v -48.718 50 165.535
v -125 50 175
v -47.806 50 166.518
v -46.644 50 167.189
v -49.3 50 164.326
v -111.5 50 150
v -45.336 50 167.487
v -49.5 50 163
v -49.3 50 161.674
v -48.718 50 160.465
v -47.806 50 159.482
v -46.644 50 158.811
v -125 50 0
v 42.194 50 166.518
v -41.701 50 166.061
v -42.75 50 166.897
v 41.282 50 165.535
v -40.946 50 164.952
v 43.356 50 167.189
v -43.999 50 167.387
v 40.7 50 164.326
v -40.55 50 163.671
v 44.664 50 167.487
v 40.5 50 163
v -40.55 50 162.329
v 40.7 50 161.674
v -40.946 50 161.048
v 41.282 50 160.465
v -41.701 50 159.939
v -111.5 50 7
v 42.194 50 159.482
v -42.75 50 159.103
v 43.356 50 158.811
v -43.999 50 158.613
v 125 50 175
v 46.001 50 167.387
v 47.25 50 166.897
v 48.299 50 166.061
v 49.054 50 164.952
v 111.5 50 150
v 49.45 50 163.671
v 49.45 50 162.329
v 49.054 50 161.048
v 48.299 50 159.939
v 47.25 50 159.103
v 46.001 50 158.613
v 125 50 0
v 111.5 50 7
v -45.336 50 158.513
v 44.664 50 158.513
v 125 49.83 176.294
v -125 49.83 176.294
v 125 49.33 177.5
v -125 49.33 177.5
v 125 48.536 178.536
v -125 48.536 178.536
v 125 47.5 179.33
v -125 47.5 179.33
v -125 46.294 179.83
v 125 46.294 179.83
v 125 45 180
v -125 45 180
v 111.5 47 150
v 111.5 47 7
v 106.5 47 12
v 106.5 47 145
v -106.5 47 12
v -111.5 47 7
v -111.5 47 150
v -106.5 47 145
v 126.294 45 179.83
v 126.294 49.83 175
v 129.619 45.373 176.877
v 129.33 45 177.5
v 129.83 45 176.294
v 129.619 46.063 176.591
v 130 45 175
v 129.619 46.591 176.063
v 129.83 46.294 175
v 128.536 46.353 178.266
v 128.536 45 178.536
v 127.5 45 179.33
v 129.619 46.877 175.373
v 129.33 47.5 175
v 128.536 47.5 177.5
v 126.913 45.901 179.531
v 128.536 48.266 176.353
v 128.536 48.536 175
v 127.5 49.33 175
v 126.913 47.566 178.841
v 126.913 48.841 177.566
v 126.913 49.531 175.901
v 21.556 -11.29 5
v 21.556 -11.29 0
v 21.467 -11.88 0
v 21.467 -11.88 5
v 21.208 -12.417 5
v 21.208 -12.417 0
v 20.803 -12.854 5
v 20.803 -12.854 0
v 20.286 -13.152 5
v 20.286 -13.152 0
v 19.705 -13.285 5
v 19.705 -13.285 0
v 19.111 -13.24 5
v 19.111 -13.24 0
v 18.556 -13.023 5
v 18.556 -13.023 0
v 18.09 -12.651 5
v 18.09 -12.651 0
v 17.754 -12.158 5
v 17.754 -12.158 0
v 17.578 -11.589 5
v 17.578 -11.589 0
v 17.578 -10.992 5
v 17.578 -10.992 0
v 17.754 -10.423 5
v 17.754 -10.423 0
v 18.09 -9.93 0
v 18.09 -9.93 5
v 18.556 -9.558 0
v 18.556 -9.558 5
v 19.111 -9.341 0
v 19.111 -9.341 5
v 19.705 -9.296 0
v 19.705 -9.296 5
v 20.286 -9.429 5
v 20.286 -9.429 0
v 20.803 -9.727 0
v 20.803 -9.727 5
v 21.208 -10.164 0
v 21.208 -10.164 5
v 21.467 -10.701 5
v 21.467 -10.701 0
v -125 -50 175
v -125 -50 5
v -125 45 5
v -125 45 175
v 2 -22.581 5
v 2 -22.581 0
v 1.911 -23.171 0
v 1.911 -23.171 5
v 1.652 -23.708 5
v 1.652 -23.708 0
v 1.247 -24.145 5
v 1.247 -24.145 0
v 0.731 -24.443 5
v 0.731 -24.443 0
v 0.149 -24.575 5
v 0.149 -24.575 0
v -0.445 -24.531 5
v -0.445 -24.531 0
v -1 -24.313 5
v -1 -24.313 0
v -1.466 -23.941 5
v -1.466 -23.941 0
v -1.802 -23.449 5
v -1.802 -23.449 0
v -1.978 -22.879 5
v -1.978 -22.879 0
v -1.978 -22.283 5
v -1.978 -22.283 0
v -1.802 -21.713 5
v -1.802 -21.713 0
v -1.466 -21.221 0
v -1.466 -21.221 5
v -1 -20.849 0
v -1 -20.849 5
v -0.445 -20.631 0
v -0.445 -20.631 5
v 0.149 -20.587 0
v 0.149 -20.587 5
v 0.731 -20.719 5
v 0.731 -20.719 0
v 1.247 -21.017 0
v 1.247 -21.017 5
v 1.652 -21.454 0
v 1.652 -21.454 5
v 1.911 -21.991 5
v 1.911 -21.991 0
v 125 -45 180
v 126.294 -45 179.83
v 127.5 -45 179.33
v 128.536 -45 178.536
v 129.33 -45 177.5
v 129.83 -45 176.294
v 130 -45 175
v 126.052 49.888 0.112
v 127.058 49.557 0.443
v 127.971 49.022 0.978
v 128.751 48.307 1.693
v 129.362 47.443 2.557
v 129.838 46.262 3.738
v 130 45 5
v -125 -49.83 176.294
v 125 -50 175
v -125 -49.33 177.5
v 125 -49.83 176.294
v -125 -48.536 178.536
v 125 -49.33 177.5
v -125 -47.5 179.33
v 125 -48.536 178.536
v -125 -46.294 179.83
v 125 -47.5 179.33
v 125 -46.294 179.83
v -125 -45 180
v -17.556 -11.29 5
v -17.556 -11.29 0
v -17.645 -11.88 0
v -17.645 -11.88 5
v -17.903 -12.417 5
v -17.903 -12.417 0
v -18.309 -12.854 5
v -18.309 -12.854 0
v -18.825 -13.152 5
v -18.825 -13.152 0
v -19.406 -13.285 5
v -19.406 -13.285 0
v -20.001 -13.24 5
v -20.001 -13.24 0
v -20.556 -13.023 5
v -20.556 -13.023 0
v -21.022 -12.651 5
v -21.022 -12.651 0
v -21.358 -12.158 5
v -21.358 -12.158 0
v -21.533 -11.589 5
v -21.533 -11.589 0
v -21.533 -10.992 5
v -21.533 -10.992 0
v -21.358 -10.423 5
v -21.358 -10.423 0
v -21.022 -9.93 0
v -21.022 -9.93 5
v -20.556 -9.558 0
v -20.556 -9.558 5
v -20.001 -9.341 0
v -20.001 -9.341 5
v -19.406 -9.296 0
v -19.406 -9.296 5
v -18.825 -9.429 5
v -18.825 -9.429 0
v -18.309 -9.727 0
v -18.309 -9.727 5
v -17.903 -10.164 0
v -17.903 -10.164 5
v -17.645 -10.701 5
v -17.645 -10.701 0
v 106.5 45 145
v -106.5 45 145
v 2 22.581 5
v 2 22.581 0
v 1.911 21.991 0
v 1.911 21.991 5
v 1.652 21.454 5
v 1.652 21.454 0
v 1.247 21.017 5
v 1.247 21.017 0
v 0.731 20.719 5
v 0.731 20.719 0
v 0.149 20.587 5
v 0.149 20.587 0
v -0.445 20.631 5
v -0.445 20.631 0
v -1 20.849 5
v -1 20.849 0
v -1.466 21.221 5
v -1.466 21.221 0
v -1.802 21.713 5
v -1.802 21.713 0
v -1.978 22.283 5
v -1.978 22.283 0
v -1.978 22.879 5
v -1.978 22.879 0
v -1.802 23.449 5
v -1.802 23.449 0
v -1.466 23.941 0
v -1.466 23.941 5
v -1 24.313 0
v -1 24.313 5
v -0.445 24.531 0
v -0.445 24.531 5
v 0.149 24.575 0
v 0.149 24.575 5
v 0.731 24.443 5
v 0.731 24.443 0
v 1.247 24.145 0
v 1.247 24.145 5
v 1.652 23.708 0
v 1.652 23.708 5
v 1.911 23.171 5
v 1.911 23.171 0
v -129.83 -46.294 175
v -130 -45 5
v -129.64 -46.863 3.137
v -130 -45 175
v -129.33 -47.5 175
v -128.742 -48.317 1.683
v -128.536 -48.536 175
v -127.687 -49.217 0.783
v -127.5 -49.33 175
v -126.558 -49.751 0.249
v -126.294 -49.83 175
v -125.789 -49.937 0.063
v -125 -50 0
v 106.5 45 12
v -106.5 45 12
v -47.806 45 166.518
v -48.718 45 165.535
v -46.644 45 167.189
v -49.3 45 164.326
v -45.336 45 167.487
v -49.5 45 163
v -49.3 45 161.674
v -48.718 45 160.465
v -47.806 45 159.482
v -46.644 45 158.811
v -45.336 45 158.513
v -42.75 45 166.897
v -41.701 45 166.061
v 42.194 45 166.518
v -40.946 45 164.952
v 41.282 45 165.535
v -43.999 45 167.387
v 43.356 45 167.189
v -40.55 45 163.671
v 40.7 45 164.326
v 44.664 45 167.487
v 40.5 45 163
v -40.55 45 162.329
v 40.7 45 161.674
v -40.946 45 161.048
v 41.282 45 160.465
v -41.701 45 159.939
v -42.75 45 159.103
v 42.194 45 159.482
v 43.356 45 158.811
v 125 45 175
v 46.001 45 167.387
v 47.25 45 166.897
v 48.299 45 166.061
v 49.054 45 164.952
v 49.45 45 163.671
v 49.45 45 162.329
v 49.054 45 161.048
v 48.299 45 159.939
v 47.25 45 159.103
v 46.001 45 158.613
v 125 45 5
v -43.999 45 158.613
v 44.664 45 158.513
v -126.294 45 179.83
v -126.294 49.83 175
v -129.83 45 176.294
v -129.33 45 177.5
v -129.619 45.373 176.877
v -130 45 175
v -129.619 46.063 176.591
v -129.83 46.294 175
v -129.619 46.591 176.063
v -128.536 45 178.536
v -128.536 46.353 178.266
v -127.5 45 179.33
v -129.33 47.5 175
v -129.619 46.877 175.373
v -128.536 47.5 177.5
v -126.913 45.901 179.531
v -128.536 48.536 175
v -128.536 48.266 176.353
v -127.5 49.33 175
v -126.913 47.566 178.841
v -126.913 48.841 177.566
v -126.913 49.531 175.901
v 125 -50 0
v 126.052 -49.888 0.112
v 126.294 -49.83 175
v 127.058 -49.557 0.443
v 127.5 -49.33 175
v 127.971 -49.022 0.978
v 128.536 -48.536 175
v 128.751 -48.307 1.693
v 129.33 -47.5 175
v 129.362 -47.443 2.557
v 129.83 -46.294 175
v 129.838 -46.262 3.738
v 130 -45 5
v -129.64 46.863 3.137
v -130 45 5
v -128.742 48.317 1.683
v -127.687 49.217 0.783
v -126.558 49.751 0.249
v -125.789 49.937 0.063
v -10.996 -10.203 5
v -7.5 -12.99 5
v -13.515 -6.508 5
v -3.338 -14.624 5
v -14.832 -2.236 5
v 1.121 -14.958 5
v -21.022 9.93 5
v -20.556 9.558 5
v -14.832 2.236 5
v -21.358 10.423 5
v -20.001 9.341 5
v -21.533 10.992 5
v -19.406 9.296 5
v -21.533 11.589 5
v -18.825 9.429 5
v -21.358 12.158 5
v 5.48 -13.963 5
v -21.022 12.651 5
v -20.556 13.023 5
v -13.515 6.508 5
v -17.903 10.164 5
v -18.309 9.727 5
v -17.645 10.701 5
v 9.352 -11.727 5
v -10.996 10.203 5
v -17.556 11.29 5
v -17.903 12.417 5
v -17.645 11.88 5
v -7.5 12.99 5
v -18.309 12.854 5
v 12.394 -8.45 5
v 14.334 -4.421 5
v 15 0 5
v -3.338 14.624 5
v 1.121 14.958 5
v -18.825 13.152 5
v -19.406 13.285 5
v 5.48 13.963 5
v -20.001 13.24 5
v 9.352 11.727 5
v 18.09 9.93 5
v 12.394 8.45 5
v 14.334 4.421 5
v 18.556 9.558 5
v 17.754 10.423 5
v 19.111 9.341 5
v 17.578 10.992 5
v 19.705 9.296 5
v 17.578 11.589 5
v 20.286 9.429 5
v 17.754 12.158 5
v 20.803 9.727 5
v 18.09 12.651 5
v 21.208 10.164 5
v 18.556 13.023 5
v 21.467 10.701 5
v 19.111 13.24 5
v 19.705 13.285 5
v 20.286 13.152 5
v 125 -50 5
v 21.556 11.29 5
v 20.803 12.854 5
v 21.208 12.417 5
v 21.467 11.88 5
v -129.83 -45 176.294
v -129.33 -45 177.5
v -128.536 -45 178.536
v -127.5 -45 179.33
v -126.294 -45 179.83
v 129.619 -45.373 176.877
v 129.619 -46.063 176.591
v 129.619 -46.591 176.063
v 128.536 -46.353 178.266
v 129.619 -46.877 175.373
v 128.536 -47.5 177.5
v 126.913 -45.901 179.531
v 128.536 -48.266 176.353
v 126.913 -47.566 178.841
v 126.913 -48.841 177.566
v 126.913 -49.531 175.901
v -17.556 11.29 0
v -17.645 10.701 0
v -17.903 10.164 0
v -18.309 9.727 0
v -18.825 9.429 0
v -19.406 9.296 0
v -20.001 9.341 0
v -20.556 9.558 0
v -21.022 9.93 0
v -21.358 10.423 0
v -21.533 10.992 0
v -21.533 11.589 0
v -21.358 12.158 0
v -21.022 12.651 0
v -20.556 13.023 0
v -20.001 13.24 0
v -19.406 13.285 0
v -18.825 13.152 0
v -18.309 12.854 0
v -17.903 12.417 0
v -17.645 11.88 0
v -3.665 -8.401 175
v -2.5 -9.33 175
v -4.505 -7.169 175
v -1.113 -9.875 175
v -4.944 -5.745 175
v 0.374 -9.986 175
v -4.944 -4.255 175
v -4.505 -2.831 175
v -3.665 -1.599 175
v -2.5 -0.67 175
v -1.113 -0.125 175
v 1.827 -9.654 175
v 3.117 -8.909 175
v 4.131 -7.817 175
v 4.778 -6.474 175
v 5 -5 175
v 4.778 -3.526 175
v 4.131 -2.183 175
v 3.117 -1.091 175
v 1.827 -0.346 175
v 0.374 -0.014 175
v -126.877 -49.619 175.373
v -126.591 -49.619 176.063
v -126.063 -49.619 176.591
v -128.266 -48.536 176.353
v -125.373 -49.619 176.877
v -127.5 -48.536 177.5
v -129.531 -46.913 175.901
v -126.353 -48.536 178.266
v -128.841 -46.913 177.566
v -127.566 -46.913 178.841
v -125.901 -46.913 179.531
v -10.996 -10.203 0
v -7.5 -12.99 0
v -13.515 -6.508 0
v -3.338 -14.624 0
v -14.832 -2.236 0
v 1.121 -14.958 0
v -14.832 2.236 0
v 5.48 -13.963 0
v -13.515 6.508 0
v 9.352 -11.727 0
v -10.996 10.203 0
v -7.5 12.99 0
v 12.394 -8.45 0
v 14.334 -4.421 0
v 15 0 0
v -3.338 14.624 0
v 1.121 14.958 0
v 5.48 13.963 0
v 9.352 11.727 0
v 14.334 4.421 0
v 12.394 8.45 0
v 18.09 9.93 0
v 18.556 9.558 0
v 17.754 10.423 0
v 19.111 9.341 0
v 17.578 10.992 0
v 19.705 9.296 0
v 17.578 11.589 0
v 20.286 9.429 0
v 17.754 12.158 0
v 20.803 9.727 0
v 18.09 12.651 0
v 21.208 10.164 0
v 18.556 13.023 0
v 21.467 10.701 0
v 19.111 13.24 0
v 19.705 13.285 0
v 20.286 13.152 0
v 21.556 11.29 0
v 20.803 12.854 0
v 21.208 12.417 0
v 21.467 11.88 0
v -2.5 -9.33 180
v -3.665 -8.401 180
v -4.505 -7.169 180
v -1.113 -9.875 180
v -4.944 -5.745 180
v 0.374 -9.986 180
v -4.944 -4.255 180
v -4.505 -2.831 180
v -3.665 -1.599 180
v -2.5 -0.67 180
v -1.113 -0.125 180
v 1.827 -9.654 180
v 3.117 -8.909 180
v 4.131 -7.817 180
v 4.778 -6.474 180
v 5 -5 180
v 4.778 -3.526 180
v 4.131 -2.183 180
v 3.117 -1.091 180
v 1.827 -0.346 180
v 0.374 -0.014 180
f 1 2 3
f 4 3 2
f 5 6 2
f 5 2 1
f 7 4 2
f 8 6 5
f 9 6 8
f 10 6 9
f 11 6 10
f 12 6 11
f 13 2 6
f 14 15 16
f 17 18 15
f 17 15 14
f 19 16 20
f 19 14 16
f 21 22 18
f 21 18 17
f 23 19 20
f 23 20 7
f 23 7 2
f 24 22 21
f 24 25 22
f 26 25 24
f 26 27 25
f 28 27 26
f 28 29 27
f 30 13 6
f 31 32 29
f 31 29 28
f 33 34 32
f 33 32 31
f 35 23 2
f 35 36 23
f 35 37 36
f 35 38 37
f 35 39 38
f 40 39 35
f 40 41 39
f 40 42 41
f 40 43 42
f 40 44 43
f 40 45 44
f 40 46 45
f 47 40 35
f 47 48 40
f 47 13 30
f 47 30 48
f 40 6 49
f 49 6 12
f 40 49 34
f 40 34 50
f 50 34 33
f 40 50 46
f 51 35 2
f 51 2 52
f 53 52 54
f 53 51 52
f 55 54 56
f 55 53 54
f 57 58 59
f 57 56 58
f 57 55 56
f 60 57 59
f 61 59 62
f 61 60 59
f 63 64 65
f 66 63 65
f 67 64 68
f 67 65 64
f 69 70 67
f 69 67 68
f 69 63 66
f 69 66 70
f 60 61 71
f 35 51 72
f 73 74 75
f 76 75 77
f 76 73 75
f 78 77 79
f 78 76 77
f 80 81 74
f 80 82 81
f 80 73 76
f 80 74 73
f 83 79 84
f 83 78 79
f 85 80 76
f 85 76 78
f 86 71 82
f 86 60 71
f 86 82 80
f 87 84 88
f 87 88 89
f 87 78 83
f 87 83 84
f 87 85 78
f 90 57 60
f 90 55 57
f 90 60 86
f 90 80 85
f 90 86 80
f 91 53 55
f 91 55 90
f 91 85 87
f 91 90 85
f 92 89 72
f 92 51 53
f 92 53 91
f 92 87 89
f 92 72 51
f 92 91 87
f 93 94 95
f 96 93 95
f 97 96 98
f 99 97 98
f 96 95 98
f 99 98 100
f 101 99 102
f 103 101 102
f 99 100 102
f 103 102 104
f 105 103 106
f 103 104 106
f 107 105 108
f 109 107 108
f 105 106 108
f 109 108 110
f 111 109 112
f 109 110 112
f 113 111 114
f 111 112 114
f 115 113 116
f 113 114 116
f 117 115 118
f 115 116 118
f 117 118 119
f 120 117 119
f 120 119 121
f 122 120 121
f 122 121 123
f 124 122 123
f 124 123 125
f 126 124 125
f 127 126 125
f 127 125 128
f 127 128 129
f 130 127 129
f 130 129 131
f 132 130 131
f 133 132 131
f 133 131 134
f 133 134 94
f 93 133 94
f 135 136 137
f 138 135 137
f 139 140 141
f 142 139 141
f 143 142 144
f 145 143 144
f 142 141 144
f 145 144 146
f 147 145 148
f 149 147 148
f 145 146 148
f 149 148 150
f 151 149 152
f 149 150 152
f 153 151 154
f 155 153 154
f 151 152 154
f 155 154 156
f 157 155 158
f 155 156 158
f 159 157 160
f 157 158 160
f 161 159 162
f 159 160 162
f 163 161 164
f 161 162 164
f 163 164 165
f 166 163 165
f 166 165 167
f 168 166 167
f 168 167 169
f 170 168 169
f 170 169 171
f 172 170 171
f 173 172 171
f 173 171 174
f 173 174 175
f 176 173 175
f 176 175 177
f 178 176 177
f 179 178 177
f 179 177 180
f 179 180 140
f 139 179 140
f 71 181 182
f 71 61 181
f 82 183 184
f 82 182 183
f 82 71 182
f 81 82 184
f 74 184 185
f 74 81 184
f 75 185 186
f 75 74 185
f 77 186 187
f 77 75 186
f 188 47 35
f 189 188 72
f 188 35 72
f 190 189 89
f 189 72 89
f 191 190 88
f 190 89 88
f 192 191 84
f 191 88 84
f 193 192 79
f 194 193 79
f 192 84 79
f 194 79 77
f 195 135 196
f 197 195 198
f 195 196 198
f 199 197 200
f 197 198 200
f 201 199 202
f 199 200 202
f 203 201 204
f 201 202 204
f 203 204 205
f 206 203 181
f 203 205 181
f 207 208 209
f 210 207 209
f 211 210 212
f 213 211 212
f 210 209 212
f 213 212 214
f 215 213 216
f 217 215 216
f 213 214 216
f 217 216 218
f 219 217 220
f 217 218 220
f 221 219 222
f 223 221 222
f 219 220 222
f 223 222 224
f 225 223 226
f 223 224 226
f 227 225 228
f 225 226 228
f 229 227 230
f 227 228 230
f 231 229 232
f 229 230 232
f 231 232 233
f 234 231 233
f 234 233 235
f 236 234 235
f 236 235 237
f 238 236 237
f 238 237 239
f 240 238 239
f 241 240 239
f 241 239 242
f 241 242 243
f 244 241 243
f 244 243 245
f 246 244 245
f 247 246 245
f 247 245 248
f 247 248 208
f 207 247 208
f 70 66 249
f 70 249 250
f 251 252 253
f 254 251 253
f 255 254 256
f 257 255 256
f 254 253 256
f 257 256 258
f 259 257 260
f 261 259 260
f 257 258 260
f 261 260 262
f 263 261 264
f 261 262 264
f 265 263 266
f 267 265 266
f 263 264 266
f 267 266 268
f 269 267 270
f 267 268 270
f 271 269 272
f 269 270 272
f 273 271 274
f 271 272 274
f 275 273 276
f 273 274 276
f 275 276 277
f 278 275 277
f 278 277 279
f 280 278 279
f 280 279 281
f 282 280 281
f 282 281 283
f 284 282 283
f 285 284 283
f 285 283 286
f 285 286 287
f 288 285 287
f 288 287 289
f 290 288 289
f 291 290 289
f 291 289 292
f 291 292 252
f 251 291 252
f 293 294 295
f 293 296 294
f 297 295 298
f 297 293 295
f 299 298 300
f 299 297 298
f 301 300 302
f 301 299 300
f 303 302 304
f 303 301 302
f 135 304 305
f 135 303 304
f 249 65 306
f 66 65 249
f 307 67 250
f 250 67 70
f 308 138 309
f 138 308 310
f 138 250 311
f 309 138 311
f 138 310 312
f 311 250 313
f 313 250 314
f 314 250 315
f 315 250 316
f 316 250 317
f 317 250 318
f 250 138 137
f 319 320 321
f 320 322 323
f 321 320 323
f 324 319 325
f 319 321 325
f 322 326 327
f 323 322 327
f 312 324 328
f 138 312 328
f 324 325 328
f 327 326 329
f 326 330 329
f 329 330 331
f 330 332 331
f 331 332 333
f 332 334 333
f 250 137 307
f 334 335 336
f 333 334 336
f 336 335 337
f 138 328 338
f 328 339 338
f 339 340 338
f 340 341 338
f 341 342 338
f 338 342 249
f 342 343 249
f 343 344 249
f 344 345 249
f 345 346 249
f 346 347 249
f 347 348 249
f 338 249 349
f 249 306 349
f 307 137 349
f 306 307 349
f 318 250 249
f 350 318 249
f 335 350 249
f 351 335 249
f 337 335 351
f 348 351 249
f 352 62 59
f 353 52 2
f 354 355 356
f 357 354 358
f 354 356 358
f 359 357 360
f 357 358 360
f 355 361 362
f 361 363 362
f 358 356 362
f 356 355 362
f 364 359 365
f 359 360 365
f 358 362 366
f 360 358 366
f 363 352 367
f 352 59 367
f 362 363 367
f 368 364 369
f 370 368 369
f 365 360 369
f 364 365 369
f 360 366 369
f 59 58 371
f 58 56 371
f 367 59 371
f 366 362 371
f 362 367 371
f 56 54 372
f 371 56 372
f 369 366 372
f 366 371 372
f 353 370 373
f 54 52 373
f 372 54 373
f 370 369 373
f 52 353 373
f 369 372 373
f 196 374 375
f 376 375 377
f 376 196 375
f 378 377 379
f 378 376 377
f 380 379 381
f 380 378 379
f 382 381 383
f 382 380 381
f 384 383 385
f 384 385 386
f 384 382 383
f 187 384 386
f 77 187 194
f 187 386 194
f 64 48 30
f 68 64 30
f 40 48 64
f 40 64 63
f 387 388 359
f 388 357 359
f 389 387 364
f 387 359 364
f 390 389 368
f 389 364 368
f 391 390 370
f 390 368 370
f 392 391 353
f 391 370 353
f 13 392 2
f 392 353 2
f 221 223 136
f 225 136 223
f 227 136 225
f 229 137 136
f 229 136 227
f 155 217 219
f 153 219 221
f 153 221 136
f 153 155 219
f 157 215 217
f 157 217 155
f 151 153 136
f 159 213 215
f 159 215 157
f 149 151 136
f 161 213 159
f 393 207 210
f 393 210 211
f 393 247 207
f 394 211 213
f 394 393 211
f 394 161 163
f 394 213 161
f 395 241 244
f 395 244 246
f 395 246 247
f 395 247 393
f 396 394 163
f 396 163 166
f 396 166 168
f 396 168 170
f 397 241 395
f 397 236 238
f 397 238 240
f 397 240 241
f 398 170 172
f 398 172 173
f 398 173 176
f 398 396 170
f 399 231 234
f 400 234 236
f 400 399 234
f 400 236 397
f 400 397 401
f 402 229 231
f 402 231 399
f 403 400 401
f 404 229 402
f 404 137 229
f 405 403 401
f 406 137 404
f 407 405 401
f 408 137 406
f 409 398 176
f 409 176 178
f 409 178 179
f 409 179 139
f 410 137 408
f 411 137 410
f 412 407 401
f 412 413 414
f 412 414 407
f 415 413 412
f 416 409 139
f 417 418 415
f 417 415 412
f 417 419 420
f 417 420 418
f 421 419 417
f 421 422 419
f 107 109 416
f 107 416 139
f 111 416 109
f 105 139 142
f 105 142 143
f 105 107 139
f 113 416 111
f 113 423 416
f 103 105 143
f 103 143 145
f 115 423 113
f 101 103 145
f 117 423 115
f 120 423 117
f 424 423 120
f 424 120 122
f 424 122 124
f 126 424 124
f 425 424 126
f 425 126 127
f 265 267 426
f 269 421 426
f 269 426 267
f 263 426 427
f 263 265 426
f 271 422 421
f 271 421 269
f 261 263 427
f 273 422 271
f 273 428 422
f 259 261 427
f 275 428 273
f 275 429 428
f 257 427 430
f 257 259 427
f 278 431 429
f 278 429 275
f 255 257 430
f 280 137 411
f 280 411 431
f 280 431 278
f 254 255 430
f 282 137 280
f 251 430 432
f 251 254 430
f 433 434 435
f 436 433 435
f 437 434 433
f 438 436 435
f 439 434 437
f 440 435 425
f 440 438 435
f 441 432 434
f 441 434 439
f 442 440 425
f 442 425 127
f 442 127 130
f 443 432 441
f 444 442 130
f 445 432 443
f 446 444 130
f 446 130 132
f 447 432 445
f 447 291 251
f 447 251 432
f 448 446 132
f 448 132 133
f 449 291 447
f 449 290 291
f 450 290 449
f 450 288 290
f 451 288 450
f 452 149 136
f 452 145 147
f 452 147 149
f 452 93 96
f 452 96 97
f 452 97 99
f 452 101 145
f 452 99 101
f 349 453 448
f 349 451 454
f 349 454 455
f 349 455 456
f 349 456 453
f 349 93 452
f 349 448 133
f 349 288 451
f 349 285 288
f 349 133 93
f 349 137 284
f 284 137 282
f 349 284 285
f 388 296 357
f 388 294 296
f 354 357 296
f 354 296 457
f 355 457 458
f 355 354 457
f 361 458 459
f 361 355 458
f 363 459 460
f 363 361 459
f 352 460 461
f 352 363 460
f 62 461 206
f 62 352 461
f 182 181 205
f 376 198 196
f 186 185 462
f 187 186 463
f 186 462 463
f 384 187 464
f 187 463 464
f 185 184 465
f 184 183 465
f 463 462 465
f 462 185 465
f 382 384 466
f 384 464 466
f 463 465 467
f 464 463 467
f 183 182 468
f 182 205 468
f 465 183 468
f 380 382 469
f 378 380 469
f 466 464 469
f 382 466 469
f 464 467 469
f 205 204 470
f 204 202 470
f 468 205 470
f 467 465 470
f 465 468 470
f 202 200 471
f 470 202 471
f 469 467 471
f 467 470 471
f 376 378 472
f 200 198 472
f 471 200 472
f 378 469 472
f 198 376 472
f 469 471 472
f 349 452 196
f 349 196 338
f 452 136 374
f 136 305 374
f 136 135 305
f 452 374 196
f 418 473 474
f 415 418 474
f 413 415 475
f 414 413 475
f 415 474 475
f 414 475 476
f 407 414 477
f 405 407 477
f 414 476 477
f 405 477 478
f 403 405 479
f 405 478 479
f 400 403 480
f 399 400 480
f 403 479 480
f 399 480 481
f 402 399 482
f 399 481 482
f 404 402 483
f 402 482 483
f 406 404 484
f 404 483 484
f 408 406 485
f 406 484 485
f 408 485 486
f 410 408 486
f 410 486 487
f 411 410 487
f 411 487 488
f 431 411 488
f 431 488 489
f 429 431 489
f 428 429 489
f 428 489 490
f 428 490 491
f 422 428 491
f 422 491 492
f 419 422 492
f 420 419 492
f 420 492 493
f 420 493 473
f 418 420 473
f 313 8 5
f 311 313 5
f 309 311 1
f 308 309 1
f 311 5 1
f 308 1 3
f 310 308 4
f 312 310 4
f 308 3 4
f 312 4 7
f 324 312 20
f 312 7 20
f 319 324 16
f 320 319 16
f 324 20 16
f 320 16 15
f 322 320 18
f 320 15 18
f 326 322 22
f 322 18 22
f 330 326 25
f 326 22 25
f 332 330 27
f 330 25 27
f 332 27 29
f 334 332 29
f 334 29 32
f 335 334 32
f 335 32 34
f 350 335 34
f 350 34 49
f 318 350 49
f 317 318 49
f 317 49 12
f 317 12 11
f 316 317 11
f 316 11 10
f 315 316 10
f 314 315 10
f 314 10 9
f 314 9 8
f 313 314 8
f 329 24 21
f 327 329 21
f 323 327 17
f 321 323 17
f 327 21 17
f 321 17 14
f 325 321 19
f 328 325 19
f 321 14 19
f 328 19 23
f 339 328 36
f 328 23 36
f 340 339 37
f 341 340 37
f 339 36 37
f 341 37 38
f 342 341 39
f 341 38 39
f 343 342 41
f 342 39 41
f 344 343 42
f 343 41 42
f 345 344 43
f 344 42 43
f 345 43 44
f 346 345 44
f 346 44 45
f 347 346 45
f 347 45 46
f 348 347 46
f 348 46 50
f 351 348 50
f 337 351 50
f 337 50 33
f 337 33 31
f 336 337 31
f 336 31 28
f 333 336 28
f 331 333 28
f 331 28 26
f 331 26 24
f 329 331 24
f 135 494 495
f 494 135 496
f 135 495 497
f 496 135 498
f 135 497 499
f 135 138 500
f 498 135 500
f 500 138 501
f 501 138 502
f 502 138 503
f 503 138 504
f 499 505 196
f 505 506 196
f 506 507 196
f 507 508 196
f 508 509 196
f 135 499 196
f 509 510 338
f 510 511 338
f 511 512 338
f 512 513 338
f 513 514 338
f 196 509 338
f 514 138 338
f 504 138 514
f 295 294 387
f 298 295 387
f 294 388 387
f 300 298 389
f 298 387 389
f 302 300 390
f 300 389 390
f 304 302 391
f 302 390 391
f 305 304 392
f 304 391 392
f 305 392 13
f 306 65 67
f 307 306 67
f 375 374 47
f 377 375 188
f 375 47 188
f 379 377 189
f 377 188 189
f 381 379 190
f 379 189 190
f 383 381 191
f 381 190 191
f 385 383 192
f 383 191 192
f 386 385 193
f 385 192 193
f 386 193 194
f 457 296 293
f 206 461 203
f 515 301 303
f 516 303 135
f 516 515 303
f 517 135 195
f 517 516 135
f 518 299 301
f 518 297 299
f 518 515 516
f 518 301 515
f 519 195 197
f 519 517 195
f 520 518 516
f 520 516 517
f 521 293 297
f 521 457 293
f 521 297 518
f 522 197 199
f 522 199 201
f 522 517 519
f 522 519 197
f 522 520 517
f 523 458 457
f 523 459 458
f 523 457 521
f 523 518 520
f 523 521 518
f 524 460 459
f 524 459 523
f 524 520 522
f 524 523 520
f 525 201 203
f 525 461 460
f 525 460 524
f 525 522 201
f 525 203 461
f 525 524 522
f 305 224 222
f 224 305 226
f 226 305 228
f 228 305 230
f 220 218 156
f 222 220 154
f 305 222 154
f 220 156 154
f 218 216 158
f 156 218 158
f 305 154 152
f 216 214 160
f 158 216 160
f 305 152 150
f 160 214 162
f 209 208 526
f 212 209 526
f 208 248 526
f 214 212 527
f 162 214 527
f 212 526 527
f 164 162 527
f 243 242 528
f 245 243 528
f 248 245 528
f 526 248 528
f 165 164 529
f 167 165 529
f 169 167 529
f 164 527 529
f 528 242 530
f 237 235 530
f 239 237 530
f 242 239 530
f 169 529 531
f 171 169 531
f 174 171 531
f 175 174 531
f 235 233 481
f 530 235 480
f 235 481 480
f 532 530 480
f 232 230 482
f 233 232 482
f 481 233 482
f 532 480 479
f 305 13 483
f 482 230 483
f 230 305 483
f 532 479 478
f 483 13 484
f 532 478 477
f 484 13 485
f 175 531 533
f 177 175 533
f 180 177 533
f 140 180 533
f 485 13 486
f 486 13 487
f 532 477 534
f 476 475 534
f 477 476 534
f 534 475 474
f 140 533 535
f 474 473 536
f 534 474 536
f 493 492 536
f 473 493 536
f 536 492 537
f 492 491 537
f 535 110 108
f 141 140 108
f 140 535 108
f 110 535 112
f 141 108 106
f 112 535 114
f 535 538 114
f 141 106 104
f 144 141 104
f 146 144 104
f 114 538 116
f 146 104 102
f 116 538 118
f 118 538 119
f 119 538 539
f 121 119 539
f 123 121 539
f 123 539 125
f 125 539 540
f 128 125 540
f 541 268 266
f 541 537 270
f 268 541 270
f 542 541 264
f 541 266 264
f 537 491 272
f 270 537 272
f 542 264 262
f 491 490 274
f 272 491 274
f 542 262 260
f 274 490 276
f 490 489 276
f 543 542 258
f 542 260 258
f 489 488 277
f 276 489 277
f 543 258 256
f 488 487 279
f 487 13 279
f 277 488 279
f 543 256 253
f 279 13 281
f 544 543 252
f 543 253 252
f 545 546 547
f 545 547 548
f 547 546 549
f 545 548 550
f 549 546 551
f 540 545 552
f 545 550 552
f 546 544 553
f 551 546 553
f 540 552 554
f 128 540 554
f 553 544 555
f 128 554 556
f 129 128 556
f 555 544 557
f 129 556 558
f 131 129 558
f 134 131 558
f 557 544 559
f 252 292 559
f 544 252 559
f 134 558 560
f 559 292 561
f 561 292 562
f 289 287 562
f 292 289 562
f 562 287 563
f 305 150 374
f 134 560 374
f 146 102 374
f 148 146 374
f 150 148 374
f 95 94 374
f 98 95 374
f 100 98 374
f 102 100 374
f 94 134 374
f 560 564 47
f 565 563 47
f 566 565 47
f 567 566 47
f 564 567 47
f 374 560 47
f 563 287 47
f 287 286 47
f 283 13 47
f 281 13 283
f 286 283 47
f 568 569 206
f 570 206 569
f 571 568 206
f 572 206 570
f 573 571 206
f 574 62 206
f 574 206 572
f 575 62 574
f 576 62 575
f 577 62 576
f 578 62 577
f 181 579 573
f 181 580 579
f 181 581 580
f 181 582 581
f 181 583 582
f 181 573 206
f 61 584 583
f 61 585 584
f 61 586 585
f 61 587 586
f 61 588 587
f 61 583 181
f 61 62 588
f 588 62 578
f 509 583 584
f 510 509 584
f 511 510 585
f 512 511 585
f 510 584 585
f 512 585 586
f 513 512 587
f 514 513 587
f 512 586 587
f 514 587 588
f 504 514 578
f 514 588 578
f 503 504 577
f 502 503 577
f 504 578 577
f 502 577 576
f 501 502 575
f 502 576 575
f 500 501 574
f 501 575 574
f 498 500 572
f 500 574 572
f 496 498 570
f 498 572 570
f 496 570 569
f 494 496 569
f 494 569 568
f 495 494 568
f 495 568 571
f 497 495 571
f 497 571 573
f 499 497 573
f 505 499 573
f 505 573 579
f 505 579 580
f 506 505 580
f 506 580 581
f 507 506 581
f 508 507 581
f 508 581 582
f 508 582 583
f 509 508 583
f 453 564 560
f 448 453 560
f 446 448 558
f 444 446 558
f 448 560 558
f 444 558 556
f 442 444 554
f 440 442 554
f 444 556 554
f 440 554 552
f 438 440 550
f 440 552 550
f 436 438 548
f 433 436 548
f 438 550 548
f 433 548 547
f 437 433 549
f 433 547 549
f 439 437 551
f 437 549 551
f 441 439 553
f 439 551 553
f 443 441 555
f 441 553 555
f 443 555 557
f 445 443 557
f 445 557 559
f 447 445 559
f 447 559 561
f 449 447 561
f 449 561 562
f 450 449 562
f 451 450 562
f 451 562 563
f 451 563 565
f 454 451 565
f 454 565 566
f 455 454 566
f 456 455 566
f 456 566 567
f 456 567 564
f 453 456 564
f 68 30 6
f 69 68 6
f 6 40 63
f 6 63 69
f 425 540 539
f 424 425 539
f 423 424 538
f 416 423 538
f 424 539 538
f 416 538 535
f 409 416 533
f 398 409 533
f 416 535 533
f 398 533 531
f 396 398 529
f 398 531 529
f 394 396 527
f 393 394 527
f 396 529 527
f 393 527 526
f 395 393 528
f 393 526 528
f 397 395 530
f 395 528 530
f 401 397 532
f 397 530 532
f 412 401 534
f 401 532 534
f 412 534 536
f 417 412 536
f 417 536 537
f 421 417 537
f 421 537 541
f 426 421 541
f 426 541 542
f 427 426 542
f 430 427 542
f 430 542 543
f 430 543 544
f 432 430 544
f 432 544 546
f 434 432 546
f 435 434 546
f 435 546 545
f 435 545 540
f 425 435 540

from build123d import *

# Parameters (mm, degrees)
F0_W      = 260
F0_H      = 100
F1_DEPTH  = 180
F2_T      = -5
F3_W      = 223
F3_H      = 143
F3_W_2    = 212.9999995232
F3_H_2    = 132.9999995232
F4_DEPTH  = 3
F5_DEPTH  = 25
F3_R      = 4.5
F6_DEPTH  = 25
F7_R      = 2
F7_R_2    = 15
F8_DEPTH  = 25
F9_R      = 4.99999
F10_R     = 5
F11_DEPTH = 25


# Not quite as in the source:
# - a fillet or chamfer is up to 0.001 mm smaller than in the source, because OpenCascade refuses the exact size


with BuildPart() as f1:
    # F0 (on Top) → F1 (new body)
    with BuildSketch(Plane.XY):
        Rectangle(F0_W, F0_H)
    extrude(amount=F1_DEPTH)

    # F2
    f2_openings = [f1.faces().sort_by_distance(p)[0] for p in [
        (0, -50, 90),
    ]]
    offset(amount=F2_T, openings=f2_openings)

    # F3 (on face) → F4 (cut)
    with BuildSketch(Plane(origin=(0, 50, 0), x_dir=(-1, 0, 0), z_dir=(0, 1, 0))):
        with Locations((0, 78.5)):
            Rectangle(F3_W, F3_H)
        with Locations((0, 78.5)):
            Rectangle(F3_W_2, F3_H_2, mode=Mode.SUBTRACT)
    extrude(amount=-F4_DEPTH, mode=Mode.SUBTRACT)

    # F5 (cut): a face of the model
    f5_faces = [f1.faces().sort_by_distance(p)[0] for p in [
        (0, 50, 78.5),
    ]]
    extrude(f5_faces, amount=-F5_DEPTH, mode=Mode.SUBTRACT)

    # F3 (on face) → F6 (cut)
    with BuildSketch(Plane(origin=(0, 50, 0), x_dir=(-1, 0, 0), z_dir=(0, 1, 0))):
        with Locations((-45, 163)):
            Circle(F3_R)
        with Locations((45, 163)):
            Circle(F3_R)
    extrude(amount=-F6_DEPTH, mode=Mode.SUBTRACT)

    # F7 (on face) → F8 (cut)
    with BuildSketch(Plane(origin=(0, 0, 0), x_dir=(1, 0, 0), z_dir=(0, 0, -1))):
        with Locations((-19.5557196429, 11.2905)):
            Circle(F7_R)
        with Locations((0, 22.581)):
            Circle(F7_R)
        with Locations((19.5557196429, 11.2905)):
            Circle(F7_R)
        with Locations((19.5557196429, -11.2905)):
            Circle(F7_R)
        with Locations((0, -22.581)):
            Circle(F7_R)
        with Locations((-19.5557196429, -11.2905)):
            Circle(F7_R)
        Circle(F7_R_2)
    extrude(amount=-F8_DEPTH, mode=Mode.SUBTRACT)

    # F9 (radius 5 in the source; OpenCascade refuses exactly that, so slightly less here)
    f9_edges = [f1.edges().sort_by_distance(p)[0] for p in [
        (0, 50, 180),
        (-130, 0, 180),
        (-130, 50, 90),
        (-130, -50, 90),
        (-130, 0, 0),
        (0, -50, 180),
        (130, 0, 180),
        (130, -50, 90),
        (130, 50, 90),
        (130, 0, 0),
    ]]
    fillet(f9_edges, radius=F9_R)

    # F10 (on face) → F11 (cut)
    with BuildSketch(Plane.XY.offset(180)):
        with Locations((0, -5)):
            Circle(F10_R)
    extrude(amount=-F11_DEPTH, mode=Mode.SUBTRACT)


solid = f1.part
